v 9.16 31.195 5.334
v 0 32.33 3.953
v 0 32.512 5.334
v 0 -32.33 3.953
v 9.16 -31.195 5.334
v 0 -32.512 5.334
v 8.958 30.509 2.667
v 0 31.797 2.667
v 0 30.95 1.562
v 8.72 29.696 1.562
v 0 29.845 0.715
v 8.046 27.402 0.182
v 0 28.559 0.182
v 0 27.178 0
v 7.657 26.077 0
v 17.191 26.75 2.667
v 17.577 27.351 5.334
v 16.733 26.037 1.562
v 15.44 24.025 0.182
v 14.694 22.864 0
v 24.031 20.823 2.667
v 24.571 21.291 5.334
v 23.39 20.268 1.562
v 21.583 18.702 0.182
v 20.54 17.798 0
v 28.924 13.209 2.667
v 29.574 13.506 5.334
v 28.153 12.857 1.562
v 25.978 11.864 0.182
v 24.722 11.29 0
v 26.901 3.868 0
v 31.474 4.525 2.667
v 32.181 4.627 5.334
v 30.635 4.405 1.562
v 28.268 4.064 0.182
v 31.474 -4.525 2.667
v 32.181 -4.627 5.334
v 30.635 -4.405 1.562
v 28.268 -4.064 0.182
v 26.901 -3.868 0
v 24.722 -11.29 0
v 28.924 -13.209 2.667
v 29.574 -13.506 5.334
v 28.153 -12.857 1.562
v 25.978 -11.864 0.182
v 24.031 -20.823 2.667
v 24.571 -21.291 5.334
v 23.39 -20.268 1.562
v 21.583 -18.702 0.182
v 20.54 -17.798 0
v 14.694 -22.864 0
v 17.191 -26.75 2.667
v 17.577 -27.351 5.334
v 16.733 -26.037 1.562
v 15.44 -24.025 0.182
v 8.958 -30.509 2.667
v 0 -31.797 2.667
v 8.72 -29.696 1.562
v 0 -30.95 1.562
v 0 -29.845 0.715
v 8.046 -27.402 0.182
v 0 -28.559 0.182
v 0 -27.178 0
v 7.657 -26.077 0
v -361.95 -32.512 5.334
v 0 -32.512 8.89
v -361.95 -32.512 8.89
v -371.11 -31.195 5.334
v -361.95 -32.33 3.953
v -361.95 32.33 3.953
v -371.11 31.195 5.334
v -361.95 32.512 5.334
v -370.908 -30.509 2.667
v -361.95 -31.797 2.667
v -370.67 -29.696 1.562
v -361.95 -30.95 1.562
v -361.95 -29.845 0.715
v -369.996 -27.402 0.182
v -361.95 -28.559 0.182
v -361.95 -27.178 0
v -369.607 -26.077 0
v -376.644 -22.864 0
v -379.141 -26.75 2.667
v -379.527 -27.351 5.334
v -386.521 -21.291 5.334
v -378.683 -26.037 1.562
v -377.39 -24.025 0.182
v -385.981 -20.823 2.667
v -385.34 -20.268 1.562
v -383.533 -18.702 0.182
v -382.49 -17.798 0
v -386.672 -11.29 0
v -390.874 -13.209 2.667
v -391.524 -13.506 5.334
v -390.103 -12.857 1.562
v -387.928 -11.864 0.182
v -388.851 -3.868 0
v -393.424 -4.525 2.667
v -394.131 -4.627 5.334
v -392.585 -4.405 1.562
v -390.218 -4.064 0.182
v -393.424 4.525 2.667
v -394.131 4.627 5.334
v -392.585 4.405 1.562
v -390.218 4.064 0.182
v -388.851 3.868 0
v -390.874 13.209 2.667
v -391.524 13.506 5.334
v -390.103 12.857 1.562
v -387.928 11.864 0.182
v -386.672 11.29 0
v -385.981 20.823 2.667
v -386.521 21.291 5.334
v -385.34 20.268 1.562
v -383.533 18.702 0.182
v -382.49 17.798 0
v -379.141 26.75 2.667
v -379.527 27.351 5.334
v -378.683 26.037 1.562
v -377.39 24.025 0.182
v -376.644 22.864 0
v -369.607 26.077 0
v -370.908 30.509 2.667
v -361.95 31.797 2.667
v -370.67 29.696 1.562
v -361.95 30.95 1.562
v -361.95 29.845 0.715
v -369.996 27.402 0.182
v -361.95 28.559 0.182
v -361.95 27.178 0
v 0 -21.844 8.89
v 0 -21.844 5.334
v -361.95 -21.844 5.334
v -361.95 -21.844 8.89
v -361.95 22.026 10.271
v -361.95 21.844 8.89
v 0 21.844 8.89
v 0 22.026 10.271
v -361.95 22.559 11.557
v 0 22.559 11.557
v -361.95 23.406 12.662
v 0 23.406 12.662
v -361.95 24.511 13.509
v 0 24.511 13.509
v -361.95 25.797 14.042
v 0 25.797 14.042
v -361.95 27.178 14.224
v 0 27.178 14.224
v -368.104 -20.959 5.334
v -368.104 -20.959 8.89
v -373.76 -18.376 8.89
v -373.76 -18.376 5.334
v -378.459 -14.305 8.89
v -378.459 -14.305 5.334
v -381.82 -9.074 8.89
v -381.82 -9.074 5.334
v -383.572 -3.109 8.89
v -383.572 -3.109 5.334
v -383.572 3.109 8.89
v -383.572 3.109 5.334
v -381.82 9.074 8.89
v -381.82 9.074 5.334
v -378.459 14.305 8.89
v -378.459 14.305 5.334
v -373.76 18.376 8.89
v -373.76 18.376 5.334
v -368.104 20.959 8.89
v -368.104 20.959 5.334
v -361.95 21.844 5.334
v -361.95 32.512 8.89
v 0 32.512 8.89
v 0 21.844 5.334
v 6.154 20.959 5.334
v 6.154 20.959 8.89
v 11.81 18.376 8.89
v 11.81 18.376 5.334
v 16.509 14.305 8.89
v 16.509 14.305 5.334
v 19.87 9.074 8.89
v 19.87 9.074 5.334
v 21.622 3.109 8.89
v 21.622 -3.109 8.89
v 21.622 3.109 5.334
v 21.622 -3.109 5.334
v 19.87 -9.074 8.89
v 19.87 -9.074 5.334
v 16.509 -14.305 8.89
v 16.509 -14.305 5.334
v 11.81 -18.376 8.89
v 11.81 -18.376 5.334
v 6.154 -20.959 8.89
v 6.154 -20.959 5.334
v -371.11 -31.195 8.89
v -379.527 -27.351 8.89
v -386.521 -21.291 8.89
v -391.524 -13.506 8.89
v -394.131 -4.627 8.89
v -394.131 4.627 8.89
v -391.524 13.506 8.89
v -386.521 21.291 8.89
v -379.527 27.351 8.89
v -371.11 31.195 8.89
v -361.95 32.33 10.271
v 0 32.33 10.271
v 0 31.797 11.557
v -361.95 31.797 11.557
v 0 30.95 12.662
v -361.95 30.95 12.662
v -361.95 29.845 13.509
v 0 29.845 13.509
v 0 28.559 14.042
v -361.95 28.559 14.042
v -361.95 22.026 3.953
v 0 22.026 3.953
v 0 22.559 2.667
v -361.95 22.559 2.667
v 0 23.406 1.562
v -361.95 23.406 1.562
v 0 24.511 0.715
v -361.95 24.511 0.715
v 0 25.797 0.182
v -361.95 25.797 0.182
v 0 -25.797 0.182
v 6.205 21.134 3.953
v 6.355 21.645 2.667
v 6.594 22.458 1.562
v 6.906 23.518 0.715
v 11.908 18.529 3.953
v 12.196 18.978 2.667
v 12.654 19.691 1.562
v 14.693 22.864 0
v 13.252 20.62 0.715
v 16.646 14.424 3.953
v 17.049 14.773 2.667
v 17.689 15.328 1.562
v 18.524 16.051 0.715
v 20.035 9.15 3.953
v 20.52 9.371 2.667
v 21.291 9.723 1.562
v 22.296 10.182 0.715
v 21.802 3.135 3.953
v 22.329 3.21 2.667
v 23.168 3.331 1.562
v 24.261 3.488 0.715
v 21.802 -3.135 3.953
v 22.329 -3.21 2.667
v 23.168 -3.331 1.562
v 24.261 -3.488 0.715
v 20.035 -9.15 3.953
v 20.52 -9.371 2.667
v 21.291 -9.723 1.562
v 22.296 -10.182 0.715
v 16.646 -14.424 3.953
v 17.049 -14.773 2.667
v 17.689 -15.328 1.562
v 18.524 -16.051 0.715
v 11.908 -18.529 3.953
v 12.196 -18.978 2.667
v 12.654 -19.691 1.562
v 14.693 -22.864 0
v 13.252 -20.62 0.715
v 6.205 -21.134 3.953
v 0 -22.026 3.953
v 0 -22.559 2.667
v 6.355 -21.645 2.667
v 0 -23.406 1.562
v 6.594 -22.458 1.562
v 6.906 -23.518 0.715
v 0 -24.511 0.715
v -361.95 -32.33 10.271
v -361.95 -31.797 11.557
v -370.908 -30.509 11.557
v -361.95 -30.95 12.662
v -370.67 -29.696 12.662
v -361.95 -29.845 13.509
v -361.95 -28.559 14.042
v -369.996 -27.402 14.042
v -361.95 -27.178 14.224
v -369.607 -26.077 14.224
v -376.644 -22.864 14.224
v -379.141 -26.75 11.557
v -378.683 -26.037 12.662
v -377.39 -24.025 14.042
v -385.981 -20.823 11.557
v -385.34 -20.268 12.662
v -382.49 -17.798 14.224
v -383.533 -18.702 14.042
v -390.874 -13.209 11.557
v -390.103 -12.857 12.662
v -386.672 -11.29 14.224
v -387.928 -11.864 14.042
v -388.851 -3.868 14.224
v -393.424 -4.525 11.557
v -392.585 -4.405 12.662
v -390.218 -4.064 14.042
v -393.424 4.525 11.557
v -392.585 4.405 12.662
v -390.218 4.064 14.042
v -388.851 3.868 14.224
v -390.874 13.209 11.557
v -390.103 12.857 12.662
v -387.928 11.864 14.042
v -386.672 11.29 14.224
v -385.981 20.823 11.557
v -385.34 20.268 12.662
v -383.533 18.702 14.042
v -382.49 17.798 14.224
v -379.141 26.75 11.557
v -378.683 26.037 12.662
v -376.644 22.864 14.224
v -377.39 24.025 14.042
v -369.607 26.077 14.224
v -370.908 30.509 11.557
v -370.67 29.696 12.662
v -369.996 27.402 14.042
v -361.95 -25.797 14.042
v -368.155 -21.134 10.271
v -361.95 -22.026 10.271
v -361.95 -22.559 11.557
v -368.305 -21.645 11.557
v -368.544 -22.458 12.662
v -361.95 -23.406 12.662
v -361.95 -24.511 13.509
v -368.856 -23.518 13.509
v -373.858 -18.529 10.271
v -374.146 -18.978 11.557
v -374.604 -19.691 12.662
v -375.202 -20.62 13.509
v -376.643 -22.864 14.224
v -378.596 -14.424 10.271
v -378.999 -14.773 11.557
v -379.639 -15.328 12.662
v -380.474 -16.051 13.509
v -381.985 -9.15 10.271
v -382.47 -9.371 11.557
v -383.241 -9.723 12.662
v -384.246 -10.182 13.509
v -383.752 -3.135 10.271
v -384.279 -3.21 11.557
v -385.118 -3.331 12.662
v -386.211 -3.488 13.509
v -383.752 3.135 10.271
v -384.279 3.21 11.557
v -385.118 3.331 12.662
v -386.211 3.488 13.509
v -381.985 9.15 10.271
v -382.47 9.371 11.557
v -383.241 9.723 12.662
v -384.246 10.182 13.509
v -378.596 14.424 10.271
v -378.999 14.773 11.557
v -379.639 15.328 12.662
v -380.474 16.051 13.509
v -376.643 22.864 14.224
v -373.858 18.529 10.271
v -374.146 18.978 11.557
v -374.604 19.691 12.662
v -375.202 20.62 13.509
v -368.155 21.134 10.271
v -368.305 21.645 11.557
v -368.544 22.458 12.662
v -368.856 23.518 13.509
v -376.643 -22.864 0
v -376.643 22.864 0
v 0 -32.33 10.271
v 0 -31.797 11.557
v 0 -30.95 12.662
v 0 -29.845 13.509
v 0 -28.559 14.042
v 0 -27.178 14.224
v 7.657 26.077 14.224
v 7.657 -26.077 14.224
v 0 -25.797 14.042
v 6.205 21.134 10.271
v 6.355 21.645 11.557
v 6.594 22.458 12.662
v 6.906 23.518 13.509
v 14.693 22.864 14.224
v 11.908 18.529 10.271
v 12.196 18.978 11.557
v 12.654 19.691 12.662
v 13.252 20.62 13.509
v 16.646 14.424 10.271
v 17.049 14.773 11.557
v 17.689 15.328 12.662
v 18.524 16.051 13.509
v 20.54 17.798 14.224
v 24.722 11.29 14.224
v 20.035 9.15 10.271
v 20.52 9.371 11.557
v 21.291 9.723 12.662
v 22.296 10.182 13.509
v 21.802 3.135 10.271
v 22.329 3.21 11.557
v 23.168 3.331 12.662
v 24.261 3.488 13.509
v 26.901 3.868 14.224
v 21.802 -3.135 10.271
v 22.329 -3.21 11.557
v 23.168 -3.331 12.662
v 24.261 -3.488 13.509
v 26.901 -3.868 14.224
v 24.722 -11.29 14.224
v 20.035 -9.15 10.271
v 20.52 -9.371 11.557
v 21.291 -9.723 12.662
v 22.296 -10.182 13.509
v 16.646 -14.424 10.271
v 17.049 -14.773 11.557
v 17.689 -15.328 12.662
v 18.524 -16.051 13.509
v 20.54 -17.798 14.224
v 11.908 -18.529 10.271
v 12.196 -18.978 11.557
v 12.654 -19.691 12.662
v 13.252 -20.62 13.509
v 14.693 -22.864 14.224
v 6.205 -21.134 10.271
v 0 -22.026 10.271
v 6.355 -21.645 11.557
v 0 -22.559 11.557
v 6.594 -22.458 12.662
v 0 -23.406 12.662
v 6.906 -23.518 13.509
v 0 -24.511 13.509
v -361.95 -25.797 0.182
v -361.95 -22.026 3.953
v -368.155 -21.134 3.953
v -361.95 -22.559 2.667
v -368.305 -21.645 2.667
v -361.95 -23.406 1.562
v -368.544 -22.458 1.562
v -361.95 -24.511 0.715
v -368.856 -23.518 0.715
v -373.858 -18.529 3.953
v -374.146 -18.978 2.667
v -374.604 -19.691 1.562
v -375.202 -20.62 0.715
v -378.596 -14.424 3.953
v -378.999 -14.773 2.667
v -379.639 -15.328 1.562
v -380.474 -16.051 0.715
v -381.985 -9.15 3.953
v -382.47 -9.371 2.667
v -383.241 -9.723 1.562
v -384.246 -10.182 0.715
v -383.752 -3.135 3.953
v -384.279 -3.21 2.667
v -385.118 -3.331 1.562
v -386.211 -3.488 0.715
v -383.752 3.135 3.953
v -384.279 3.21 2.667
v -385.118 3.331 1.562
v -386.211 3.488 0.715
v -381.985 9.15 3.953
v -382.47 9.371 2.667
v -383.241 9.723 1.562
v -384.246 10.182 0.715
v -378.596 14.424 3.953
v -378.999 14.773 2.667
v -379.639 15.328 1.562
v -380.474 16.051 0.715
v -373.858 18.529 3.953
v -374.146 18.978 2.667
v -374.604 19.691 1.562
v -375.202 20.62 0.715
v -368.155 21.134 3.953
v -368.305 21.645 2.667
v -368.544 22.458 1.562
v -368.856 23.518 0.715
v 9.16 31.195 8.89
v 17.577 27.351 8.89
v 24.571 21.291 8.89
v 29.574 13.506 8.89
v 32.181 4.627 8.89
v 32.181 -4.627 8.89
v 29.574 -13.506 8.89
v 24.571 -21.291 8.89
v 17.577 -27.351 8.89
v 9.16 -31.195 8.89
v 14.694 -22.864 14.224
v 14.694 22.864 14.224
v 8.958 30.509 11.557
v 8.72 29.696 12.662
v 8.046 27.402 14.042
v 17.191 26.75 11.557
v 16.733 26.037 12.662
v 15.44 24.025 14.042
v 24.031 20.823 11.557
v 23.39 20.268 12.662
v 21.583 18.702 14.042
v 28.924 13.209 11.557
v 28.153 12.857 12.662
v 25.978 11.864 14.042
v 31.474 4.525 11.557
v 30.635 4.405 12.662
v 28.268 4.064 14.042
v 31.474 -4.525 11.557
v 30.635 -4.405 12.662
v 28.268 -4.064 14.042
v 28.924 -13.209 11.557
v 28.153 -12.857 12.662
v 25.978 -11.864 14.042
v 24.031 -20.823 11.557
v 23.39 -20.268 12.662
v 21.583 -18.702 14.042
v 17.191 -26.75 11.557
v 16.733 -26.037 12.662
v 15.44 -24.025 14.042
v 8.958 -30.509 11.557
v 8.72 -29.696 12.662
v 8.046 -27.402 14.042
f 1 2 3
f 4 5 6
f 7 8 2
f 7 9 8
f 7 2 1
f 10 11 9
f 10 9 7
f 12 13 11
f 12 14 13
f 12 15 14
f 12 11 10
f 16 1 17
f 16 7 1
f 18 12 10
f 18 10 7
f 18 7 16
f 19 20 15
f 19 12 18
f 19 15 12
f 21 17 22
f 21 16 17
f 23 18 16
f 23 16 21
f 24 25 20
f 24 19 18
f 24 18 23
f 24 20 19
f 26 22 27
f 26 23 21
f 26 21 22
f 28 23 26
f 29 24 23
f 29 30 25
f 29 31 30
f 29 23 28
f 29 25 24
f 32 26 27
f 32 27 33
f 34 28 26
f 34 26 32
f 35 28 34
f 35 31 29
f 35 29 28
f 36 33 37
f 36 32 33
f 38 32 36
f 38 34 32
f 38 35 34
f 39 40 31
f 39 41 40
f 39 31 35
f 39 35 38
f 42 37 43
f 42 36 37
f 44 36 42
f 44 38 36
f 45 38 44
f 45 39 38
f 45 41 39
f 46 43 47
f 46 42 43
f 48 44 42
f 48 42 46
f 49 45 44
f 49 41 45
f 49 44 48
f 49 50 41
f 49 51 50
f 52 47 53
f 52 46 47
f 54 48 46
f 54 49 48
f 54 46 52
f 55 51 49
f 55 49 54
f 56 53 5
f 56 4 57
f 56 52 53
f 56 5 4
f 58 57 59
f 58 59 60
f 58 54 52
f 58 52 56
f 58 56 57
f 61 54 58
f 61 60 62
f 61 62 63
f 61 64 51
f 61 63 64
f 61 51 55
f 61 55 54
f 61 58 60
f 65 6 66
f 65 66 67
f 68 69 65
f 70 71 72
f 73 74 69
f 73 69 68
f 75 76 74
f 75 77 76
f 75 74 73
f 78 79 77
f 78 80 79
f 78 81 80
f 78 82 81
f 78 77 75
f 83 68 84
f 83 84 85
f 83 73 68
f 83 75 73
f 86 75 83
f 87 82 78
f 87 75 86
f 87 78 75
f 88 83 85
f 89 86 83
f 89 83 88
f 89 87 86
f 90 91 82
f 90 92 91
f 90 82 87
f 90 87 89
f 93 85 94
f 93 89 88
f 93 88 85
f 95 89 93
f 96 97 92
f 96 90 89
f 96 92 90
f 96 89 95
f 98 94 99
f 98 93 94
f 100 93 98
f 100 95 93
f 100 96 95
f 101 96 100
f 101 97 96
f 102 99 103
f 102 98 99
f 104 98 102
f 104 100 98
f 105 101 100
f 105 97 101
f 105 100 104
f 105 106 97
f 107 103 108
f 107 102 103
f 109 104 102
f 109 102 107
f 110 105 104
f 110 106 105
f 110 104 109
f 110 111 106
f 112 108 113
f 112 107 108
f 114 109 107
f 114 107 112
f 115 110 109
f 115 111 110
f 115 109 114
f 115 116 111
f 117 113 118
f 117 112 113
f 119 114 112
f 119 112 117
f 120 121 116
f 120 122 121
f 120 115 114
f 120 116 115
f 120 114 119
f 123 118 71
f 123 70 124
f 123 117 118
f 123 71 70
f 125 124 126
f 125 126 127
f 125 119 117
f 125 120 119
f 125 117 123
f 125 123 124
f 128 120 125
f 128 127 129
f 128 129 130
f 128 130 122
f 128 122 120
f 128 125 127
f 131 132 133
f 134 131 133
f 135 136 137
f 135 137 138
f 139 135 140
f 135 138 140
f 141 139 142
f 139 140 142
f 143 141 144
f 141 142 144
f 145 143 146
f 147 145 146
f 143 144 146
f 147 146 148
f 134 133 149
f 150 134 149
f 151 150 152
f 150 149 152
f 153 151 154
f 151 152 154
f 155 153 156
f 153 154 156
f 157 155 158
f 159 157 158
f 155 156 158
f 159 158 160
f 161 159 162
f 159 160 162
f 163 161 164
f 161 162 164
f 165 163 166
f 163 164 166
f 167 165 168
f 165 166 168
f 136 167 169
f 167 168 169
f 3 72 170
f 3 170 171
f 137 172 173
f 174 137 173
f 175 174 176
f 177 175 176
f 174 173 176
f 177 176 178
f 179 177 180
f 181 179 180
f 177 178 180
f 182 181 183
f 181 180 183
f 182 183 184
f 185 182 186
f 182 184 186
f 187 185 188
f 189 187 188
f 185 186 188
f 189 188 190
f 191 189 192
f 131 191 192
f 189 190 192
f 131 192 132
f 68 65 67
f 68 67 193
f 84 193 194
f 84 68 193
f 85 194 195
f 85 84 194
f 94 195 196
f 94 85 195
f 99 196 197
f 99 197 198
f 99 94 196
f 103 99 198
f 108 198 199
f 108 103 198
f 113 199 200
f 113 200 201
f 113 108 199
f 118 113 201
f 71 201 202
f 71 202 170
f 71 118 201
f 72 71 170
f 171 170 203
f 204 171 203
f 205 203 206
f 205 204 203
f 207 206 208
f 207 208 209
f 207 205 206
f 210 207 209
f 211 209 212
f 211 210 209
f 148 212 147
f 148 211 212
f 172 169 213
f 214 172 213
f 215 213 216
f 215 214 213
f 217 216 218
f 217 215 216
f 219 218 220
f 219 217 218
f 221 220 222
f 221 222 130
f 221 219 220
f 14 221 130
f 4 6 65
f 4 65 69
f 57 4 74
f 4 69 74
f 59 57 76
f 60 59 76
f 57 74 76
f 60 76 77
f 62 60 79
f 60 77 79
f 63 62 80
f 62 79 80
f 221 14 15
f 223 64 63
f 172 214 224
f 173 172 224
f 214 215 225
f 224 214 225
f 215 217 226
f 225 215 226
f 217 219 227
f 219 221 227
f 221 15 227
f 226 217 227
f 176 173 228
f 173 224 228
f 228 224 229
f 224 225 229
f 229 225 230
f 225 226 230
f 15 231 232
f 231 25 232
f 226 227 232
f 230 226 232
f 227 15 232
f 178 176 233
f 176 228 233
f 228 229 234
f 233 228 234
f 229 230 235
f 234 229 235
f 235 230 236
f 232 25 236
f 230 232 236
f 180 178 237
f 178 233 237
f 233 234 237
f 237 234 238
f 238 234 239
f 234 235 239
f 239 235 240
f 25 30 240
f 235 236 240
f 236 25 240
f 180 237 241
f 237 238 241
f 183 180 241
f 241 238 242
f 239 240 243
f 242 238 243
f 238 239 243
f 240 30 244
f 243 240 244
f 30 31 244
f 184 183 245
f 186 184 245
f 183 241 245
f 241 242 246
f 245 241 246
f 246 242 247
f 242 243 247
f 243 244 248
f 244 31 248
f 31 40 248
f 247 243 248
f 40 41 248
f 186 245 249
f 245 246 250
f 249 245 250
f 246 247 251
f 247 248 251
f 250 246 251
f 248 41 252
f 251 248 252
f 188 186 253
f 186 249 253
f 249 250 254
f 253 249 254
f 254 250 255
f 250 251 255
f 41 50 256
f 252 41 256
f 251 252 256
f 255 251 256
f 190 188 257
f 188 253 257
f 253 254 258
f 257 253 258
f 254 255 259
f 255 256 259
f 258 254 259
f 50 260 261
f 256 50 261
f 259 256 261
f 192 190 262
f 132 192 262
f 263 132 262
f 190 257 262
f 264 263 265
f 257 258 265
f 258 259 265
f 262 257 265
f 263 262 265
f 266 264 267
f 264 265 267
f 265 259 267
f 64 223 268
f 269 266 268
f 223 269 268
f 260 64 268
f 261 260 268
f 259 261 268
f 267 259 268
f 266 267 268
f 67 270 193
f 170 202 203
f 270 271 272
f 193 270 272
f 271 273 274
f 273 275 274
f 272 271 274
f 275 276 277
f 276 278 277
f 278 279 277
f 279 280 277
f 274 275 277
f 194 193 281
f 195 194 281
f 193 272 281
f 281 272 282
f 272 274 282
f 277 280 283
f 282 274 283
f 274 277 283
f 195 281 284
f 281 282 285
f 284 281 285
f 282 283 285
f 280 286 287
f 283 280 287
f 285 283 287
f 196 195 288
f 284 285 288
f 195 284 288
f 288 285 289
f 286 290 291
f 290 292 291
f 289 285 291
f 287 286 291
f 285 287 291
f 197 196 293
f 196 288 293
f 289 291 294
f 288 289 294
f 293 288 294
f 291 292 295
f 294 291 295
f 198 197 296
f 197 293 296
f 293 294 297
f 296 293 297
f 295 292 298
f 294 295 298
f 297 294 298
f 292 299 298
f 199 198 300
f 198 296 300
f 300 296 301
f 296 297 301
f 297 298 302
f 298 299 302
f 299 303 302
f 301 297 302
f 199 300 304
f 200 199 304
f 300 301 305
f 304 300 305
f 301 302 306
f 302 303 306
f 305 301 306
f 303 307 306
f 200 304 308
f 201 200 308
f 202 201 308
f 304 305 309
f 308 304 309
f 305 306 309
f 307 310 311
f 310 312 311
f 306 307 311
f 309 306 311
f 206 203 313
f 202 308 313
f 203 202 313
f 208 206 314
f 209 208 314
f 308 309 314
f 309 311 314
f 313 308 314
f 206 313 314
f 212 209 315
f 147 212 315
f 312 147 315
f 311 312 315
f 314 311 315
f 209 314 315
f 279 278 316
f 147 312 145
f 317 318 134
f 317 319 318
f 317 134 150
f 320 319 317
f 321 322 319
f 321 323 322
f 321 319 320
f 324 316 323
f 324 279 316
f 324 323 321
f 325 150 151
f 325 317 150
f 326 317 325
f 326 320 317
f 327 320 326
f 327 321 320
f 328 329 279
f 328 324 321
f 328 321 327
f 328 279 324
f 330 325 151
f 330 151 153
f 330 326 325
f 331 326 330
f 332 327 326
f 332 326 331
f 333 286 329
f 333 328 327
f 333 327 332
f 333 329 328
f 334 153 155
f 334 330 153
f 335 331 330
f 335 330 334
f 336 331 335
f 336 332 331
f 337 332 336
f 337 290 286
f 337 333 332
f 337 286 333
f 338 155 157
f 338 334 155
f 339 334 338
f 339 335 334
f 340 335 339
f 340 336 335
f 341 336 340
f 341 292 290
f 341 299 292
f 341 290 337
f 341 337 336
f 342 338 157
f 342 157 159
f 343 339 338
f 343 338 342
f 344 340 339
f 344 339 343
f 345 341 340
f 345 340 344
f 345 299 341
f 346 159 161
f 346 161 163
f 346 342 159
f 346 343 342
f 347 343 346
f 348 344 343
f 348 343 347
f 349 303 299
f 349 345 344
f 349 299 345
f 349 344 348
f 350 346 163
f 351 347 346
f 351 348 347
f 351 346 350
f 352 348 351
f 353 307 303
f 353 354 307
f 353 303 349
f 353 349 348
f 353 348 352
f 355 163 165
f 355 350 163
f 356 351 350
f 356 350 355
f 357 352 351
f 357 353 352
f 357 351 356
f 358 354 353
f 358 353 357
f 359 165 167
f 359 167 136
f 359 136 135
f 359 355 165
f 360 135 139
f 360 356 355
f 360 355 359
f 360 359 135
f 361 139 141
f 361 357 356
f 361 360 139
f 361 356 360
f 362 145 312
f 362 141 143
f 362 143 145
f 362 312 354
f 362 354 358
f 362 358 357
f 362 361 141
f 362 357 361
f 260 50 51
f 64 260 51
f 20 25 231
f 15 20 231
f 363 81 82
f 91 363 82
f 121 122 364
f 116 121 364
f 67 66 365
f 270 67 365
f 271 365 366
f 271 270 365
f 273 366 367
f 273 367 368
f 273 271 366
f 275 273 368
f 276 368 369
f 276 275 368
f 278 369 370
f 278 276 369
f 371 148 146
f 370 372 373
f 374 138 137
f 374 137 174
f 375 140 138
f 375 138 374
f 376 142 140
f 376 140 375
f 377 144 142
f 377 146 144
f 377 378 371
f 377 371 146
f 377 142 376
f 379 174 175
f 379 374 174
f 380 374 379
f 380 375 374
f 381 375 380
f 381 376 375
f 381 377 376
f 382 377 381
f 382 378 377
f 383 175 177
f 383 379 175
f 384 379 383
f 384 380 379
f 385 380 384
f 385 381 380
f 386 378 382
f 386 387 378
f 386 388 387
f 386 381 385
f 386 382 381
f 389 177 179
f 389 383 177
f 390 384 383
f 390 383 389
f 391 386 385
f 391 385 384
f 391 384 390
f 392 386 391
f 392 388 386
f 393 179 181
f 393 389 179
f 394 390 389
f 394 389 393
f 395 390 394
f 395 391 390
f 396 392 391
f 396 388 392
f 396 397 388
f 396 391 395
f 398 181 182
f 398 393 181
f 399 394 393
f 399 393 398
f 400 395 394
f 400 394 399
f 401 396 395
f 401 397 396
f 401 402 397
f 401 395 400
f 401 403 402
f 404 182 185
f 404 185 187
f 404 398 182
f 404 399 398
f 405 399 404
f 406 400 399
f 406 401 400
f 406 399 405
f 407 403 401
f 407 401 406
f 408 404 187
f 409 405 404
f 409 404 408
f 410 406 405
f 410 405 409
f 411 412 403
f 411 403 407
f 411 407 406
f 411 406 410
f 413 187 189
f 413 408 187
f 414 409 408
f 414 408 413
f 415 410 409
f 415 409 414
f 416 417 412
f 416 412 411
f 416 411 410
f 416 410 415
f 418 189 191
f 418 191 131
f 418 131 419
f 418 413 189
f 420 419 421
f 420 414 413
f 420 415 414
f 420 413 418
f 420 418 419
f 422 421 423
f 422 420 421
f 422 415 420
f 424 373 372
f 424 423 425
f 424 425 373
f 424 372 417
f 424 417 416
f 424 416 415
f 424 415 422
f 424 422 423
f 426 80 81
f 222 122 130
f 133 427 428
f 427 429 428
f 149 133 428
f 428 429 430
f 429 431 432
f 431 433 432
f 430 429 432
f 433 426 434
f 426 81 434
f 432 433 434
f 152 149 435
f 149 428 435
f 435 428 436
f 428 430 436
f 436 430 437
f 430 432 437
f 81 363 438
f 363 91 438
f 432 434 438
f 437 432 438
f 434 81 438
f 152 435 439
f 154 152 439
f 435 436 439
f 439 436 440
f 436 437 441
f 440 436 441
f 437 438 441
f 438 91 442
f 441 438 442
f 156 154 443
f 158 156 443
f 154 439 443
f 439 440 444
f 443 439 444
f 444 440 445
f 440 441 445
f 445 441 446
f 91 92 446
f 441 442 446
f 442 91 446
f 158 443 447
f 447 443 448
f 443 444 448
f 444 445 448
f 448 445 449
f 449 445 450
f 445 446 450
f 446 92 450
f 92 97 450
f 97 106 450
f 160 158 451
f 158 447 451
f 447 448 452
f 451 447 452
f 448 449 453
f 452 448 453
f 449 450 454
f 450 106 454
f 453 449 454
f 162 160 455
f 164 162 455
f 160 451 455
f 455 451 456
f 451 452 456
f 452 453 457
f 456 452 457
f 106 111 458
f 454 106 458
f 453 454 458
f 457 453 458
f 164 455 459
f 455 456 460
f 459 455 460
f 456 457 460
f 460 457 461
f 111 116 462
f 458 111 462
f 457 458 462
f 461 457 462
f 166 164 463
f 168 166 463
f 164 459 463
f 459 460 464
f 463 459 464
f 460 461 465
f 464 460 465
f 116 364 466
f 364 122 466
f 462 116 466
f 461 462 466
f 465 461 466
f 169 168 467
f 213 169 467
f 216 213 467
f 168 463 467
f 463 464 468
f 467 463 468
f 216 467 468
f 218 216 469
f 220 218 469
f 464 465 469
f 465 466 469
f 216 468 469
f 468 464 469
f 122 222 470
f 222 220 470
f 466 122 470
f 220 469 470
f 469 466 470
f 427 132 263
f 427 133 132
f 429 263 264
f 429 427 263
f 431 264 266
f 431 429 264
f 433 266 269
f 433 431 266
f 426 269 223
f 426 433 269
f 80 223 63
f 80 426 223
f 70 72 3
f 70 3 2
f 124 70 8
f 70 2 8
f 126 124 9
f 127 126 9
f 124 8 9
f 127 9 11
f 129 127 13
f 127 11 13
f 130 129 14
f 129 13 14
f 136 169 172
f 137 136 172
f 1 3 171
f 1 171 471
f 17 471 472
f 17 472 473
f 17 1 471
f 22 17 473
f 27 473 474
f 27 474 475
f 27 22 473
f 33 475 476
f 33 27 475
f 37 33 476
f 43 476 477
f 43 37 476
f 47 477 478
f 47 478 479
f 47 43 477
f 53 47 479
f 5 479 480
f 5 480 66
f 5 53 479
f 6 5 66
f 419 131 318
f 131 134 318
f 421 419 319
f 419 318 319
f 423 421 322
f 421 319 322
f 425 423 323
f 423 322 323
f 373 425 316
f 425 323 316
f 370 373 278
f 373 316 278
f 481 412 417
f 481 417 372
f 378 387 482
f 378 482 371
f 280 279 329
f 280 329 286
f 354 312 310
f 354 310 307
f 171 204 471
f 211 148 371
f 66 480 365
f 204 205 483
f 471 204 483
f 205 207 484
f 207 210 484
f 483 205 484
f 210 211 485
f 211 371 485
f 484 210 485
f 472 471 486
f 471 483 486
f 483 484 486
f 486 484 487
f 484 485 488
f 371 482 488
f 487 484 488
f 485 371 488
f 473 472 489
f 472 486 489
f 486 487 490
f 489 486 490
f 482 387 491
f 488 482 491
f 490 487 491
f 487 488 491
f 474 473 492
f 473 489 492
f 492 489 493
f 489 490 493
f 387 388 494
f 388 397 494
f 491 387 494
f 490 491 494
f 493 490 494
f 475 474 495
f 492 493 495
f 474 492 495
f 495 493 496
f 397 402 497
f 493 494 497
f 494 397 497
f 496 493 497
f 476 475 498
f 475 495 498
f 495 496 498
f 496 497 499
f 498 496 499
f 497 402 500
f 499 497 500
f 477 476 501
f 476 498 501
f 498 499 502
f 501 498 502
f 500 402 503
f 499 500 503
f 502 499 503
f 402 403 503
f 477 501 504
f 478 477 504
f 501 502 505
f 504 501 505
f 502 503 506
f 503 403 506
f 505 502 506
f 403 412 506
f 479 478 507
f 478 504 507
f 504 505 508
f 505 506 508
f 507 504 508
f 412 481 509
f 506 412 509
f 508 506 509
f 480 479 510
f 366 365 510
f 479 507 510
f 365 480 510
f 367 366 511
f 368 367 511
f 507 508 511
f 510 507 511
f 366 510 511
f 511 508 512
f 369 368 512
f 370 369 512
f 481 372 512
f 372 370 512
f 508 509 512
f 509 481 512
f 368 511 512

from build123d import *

# Parameters (mm, degrees)
BOSS_EXTRUDE1_DEPTH = 14.224
FILLET1_R           = 5.334


with BuildPart() as part:
    # Sketch1 → Boss-Extrude1 (new body)
    with BuildSketch(Plane.XY):
        with BuildLine():
            Line((-361.95, 32.512), (0, 32.512))
            ThreePointArc((0, 32.512), (32.512, 0), (0, -32.512))
            Line((0, -32.512), (-361.95, -32.512))
            ThreePointArc((-361.95, -32.512), (-394.462, 0), (-361.95, 32.512))
        make_face()
        with BuildLine():
            Line((0, -21.844), (-361.95, -21.844))
            ThreePointArc((-361.95, -21.844), (-383.794, 0), (-361.95, 21.844))
            Line((-361.95, 21.844), (0, 21.844))
            ThreePointArc((0, 21.844), (21.844, 0), (0, -21.844))
        make_face(mode=Mode.SUBTRACT)
    extrude(amount=BOSS_EXTRUDE1_DEPTH)

    # Fillet1
    fillet1_edges = [part.edges().sort_by_distance(p)[0] for p in [
        (32.512, 0, 14.224),
        (-180.975, 32.512, 14.224),
        (21.844, 0, 0),
        (-180.975, 21.844, 0),
        (-383.794, 0, 0),
        (-180.975, -21.844, 0),
        (21.844, 0, 14.224),
        (-180.975, 21.844, 14.224),
        (-383.794, 0, 14.224),
        (-180.975, -21.844, 14.224),
        (-394.462, 0, 14.224),
        (-180.975, 32.512, 0),
        (32.512, 0, 0),
        (-180.975, -32.512, 0),
        (-394.462, 0, 0),
        (-180.975, -32.512, 14.224),
    ]]
    fillet(fillet1_edges, radius=FILLET1_R - 0.0001)  # a hair under: the kernel refuses the full size


solid = part.part
